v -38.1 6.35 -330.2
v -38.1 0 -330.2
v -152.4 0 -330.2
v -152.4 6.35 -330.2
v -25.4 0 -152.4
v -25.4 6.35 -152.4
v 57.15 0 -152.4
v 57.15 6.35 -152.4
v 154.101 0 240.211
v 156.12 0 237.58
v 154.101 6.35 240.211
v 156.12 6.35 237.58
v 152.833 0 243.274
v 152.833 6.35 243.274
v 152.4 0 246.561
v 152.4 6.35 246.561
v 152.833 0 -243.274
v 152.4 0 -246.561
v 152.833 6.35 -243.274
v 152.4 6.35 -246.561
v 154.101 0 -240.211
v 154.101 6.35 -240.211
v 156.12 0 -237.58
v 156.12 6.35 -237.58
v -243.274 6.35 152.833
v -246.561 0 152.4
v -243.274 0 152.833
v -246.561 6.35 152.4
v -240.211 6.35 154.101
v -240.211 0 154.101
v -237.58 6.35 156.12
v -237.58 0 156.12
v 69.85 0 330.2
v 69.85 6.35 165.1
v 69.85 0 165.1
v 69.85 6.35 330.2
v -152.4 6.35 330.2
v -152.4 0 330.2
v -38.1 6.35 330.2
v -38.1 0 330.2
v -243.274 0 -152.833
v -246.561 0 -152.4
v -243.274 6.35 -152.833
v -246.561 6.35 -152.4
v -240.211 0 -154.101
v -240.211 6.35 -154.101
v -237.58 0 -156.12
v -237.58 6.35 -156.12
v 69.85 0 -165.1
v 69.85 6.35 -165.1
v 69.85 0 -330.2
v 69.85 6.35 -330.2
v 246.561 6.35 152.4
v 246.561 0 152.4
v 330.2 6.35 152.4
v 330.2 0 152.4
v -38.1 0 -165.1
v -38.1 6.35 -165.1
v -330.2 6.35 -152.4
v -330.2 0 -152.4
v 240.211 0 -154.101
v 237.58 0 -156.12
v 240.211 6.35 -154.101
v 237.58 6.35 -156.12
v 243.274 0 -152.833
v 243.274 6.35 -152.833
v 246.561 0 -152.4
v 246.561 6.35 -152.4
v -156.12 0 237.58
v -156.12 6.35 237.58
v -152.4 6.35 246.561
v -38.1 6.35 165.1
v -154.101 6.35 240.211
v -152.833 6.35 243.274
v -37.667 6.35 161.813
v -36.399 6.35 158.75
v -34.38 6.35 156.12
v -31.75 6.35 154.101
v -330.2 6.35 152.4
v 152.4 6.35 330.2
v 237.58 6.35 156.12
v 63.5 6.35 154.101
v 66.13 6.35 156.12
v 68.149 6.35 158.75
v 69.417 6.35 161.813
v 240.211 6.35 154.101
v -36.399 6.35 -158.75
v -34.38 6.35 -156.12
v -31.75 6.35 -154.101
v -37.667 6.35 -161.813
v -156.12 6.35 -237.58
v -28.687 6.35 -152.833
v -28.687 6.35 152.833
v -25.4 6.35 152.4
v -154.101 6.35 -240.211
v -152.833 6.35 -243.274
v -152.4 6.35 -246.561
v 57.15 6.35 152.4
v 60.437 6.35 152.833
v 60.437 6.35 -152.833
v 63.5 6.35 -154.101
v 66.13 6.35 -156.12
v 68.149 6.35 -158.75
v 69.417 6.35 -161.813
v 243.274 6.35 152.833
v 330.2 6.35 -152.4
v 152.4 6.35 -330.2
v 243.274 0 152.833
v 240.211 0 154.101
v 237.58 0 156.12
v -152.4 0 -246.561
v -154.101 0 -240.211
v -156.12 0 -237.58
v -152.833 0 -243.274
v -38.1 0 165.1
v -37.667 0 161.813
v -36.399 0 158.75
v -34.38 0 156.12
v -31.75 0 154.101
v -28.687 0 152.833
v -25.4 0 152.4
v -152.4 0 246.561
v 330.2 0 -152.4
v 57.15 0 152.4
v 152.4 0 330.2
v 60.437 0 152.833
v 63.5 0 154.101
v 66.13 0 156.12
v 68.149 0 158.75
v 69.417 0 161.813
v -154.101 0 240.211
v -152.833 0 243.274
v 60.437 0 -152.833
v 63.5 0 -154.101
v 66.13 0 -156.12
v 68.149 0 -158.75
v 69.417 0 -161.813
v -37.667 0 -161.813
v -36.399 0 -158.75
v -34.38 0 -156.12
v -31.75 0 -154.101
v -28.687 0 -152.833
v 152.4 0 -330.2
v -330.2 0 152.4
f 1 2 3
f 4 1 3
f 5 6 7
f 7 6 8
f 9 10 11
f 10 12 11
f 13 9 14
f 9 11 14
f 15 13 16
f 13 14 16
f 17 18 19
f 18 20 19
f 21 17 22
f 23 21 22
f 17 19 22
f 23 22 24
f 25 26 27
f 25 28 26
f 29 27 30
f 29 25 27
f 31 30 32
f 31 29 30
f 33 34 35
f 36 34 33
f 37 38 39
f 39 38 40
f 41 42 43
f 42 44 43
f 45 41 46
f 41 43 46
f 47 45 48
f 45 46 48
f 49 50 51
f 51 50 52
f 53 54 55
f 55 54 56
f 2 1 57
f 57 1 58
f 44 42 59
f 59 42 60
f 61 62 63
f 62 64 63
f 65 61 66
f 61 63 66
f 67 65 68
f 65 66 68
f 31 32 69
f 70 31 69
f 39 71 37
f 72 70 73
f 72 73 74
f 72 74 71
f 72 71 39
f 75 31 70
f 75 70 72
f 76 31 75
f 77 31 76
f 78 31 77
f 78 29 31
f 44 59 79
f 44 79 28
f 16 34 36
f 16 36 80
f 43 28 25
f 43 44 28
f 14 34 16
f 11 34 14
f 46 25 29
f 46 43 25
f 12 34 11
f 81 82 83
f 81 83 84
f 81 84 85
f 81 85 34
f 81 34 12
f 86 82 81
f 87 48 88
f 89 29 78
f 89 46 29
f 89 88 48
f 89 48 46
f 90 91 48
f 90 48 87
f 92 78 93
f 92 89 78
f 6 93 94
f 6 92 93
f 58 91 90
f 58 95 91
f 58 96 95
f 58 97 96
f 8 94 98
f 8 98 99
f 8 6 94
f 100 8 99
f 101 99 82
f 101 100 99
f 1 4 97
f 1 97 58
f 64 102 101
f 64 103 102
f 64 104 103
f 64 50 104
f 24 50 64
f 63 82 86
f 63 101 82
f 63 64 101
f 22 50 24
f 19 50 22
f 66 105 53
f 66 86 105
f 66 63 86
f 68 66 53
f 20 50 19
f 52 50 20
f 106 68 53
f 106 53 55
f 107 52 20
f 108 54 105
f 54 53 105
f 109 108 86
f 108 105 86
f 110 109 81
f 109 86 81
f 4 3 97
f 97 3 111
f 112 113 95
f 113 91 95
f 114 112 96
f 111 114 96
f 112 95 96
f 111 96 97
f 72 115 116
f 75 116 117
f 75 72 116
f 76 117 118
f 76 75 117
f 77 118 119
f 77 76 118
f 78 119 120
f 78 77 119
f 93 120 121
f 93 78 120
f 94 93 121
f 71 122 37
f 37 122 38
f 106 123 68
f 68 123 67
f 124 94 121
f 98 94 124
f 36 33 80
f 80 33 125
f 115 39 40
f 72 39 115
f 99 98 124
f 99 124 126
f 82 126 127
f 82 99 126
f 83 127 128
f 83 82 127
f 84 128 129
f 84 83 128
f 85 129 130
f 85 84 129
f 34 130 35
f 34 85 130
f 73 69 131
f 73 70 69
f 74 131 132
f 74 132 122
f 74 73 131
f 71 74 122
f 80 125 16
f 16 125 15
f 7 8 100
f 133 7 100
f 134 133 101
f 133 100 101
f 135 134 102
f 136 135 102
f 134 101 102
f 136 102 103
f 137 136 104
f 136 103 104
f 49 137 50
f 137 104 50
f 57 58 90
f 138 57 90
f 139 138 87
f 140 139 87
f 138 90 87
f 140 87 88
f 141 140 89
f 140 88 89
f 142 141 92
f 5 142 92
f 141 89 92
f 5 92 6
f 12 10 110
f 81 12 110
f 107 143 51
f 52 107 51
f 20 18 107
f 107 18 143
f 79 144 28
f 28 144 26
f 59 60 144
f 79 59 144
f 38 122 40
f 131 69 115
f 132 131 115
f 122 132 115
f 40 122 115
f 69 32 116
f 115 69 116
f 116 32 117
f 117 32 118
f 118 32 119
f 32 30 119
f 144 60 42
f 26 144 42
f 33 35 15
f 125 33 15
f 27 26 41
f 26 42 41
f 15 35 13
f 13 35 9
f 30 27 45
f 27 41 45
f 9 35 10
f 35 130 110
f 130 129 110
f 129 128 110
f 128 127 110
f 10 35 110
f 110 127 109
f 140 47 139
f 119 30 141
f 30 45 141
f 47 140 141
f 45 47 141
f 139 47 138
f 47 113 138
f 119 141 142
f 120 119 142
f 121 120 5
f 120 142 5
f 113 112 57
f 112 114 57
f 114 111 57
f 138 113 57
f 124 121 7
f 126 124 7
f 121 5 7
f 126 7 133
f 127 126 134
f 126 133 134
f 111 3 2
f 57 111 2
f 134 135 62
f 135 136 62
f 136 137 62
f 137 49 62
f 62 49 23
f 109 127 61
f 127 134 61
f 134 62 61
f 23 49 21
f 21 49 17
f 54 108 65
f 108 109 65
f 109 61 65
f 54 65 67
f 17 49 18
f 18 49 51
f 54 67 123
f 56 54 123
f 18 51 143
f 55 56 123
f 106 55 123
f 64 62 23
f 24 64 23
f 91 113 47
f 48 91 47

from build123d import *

# Parameters (mm, degrees)
BOSS_EXTRUDE1_DEPTH = 6.35
CUT_EXTRUDE2_DEPTH  = 468.016490608
FILLET1_R           = 12.7


with BuildPart() as part:
    # Sketch1 → Boss-Extrude1 (new body)
    with BuildSketch(Plane(origin=(0, 0, 0), x_dir=(1, 0, 0), z_dir=(0, 1, 0))):
        Polygon((-330.2, 152.4), (-330.2, -152.4), (-241.3, -152.4), (-152.4, -241.3), (-152.4, -330.2), (152.4, -330.2), (152.4, -241.3), (241.3, -152.4), (330.2, -152.4), (330.2, 152.4), (241.3, 152.4), (152.4, 241.3), (152.4, 330.2), (-152.4, 330.2), (-152.4, 241.3), (-241.3, 152.4), align=None)
    extrude(amount=BOSS_EXTRUDE1_DEPTH)

    # Sketch3 → Cut-Extrude2 (cut, through all)
    with BuildSketch(Plane(origin=(0, 6.35, 0), x_dir=(1, 0, 0), z_dir=(0, 1, 0))):
        with BuildLine():
            Line((69.85, 330.2), (-38.1, 330.2))
            Line((-38.1, 330.2), (-38.1, 165.1))
            ThreePointArc((-38.1, 165.1), (-34.380256121, 156.119743879), (-25.4, 152.4))
            Line((-25.4, 152.4), (57.15, 152.4))
            ThreePointArc((57.15, 152.4), (66.130256121, 156.119743879), (69.85, 165.1))
            Line((69.85, 165.1), (69.85, 330.2))
        make_face()
        with BuildLine():
            Line((69.85, -330.2), (-38.1, -330.2))
            Line((-38.1, -330.2), (-38.1, -165.1))
            ThreePointArc((-38.1, -165.1), (-34.380256121, -156.119743879), (-25.4, -152.4))
            Line((-25.4, -152.4), (57.15, -152.4))
            ThreePointArc((57.15, -152.4), (66.130256121, -156.119743879), (69.85, -165.1))
            Line((69.85, -165.1), (69.85, -330.2))
        make_face()
    extrude(amount=-CUT_EXTRUDE2_DEPTH, mode=Mode.SUBTRACT)

    # Fillet1
    fillet1_edges = [part.edges().sort_by_distance(p)[0] for p in [
        (152.4, 3.175, 241.3),
        (-152.4, 3.175, 241.3),
        (-241.3, 3.175, 152.4),
        (-241.3, 3.175, -152.4),
        (-152.4, 3.175, -241.3),
        (152.4, 3.175, -241.3),
        (241.3, 3.175, -152.4),
        (241.3, 3.175, 152.4),
    ]]
    fillet(fillet1_edges, radius=FILLET1_R)


solid = part.part
